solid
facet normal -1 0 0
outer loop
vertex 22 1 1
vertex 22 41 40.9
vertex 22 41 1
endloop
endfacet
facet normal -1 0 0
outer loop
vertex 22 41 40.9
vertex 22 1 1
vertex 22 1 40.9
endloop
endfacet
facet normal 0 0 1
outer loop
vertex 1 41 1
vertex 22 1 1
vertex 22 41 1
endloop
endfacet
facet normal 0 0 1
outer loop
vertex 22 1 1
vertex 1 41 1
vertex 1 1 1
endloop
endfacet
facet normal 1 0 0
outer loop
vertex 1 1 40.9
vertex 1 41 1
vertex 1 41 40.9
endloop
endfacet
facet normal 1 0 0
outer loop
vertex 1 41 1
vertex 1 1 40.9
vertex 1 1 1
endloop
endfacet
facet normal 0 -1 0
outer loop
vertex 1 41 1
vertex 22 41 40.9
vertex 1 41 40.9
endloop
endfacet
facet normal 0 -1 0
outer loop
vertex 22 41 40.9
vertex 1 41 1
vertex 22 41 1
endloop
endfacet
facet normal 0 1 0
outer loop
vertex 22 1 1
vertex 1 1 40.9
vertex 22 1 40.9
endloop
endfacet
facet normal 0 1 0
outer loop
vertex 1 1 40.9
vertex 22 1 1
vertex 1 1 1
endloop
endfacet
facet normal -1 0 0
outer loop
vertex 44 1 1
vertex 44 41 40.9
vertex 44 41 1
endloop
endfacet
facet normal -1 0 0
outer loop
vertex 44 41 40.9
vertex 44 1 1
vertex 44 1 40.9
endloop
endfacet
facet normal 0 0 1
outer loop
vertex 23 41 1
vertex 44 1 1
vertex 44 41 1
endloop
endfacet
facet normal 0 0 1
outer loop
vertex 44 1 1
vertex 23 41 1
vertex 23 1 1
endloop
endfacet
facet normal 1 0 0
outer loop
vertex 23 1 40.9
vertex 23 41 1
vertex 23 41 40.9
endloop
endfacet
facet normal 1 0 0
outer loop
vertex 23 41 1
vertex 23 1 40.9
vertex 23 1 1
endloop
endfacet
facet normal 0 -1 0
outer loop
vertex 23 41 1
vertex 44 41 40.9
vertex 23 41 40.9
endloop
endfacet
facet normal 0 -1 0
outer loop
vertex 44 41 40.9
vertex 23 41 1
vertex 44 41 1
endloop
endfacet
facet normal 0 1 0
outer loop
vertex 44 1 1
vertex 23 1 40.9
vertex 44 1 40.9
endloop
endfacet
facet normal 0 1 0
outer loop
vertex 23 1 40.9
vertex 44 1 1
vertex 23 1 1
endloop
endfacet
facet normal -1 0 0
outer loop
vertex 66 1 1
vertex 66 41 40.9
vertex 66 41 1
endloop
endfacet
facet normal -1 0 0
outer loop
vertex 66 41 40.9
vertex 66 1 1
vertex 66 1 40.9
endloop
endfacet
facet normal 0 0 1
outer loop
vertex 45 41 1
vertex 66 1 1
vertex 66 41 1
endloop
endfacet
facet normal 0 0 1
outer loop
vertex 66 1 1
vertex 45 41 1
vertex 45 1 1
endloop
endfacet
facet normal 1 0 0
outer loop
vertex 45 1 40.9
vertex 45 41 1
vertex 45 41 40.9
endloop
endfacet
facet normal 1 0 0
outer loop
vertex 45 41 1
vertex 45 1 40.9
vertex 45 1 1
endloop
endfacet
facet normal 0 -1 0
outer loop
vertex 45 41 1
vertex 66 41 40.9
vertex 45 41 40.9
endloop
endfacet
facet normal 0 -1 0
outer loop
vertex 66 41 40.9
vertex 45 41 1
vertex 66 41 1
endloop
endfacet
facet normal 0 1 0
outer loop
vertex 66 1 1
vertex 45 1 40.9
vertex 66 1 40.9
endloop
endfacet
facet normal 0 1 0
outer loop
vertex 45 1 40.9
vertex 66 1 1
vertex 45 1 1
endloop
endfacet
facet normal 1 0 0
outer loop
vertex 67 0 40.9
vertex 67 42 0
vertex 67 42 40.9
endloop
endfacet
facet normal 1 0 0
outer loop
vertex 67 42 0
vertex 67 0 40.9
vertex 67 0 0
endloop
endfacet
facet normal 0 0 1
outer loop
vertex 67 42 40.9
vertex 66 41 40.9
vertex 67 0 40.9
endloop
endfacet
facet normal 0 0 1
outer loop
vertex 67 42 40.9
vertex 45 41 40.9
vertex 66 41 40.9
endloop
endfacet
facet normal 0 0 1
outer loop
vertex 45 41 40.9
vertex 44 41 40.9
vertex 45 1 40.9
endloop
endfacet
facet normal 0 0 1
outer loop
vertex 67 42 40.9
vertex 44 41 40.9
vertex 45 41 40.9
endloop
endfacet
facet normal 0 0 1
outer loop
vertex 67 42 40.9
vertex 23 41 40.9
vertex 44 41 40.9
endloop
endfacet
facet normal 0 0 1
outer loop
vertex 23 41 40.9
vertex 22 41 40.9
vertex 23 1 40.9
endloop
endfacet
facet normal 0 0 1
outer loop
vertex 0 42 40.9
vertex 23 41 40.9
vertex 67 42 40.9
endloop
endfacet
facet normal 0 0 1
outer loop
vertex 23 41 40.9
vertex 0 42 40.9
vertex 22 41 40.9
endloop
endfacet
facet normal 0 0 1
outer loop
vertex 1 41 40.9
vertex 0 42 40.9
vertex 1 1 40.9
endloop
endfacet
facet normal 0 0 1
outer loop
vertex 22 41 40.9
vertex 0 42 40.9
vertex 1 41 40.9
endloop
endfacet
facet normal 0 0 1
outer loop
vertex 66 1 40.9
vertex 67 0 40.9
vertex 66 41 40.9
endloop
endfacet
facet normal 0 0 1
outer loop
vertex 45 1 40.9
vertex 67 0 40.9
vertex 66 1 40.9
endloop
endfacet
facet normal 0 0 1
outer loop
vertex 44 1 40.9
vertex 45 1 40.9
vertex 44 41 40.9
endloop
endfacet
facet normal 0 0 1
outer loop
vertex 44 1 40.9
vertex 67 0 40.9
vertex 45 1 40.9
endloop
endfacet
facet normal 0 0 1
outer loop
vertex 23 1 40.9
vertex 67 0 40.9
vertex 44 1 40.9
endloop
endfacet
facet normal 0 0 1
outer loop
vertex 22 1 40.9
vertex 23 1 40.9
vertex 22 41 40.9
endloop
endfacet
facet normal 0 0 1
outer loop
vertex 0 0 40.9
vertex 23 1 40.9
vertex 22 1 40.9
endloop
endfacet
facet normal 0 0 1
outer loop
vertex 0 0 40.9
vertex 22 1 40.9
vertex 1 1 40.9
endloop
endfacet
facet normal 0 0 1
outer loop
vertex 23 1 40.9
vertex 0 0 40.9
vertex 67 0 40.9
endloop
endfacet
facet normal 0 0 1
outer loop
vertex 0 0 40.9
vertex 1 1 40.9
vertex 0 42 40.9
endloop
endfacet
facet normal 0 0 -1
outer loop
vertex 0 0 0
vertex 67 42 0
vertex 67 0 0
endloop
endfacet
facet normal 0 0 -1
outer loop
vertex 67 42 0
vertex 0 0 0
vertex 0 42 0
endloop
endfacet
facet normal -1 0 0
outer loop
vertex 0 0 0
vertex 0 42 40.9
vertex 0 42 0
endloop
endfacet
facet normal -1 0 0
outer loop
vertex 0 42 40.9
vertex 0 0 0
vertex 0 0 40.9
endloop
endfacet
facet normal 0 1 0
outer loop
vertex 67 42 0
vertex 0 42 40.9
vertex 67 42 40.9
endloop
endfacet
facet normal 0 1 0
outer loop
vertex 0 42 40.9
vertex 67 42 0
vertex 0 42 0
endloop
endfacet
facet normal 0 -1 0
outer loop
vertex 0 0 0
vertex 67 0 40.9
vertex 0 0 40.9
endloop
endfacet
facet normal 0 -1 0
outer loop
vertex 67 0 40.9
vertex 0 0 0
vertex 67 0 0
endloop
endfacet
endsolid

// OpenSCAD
// Number of batteries, not tested under 3
$num_bats = 3;

// Width of battery, or the "middle" of the three dimensions
$bat_width = 40;

// Height of the tallest part of the battery
$bat_height = 57;

// Thickness of thinest dimension
$bat_thick = 21;

// The "percent (0-1) of of the hight for the bottom (vs top)
$height_perc = .7;

// Outer wall thickness
$wall_thick = 1;

// Inner seperator thickness
$seperator_thick = 1;

$depth_total = ($wall_thick*2) + ($seperator_thick*($num_bats-1)) + ($bat_thick*$num_bats);
$width_total = ($wall_thick*2) + $bat_width;
$height_total = $wall_thick + ($bat_height*$height_perc);


difference(){
    cube([ $depth_total, $width_total, $height_total]);
    
    for( x=[0:$num_bats-1] ){
        echo(x);
        if( x == 0){
            translate( [$wall_thick,$wall_thick,$wall_thick]) {
                cube([ $bat_thick, $bat_width, $bat_height ]);
            }
        }else{
            translate( [$wall_thick+(($bat_thick+$seperator_thick)*x),
                        $wall_thick, $wall_thick]) {
                cube([ $bat_thick, $bat_width, $bat_height ]);
            }
        }
    }
}
